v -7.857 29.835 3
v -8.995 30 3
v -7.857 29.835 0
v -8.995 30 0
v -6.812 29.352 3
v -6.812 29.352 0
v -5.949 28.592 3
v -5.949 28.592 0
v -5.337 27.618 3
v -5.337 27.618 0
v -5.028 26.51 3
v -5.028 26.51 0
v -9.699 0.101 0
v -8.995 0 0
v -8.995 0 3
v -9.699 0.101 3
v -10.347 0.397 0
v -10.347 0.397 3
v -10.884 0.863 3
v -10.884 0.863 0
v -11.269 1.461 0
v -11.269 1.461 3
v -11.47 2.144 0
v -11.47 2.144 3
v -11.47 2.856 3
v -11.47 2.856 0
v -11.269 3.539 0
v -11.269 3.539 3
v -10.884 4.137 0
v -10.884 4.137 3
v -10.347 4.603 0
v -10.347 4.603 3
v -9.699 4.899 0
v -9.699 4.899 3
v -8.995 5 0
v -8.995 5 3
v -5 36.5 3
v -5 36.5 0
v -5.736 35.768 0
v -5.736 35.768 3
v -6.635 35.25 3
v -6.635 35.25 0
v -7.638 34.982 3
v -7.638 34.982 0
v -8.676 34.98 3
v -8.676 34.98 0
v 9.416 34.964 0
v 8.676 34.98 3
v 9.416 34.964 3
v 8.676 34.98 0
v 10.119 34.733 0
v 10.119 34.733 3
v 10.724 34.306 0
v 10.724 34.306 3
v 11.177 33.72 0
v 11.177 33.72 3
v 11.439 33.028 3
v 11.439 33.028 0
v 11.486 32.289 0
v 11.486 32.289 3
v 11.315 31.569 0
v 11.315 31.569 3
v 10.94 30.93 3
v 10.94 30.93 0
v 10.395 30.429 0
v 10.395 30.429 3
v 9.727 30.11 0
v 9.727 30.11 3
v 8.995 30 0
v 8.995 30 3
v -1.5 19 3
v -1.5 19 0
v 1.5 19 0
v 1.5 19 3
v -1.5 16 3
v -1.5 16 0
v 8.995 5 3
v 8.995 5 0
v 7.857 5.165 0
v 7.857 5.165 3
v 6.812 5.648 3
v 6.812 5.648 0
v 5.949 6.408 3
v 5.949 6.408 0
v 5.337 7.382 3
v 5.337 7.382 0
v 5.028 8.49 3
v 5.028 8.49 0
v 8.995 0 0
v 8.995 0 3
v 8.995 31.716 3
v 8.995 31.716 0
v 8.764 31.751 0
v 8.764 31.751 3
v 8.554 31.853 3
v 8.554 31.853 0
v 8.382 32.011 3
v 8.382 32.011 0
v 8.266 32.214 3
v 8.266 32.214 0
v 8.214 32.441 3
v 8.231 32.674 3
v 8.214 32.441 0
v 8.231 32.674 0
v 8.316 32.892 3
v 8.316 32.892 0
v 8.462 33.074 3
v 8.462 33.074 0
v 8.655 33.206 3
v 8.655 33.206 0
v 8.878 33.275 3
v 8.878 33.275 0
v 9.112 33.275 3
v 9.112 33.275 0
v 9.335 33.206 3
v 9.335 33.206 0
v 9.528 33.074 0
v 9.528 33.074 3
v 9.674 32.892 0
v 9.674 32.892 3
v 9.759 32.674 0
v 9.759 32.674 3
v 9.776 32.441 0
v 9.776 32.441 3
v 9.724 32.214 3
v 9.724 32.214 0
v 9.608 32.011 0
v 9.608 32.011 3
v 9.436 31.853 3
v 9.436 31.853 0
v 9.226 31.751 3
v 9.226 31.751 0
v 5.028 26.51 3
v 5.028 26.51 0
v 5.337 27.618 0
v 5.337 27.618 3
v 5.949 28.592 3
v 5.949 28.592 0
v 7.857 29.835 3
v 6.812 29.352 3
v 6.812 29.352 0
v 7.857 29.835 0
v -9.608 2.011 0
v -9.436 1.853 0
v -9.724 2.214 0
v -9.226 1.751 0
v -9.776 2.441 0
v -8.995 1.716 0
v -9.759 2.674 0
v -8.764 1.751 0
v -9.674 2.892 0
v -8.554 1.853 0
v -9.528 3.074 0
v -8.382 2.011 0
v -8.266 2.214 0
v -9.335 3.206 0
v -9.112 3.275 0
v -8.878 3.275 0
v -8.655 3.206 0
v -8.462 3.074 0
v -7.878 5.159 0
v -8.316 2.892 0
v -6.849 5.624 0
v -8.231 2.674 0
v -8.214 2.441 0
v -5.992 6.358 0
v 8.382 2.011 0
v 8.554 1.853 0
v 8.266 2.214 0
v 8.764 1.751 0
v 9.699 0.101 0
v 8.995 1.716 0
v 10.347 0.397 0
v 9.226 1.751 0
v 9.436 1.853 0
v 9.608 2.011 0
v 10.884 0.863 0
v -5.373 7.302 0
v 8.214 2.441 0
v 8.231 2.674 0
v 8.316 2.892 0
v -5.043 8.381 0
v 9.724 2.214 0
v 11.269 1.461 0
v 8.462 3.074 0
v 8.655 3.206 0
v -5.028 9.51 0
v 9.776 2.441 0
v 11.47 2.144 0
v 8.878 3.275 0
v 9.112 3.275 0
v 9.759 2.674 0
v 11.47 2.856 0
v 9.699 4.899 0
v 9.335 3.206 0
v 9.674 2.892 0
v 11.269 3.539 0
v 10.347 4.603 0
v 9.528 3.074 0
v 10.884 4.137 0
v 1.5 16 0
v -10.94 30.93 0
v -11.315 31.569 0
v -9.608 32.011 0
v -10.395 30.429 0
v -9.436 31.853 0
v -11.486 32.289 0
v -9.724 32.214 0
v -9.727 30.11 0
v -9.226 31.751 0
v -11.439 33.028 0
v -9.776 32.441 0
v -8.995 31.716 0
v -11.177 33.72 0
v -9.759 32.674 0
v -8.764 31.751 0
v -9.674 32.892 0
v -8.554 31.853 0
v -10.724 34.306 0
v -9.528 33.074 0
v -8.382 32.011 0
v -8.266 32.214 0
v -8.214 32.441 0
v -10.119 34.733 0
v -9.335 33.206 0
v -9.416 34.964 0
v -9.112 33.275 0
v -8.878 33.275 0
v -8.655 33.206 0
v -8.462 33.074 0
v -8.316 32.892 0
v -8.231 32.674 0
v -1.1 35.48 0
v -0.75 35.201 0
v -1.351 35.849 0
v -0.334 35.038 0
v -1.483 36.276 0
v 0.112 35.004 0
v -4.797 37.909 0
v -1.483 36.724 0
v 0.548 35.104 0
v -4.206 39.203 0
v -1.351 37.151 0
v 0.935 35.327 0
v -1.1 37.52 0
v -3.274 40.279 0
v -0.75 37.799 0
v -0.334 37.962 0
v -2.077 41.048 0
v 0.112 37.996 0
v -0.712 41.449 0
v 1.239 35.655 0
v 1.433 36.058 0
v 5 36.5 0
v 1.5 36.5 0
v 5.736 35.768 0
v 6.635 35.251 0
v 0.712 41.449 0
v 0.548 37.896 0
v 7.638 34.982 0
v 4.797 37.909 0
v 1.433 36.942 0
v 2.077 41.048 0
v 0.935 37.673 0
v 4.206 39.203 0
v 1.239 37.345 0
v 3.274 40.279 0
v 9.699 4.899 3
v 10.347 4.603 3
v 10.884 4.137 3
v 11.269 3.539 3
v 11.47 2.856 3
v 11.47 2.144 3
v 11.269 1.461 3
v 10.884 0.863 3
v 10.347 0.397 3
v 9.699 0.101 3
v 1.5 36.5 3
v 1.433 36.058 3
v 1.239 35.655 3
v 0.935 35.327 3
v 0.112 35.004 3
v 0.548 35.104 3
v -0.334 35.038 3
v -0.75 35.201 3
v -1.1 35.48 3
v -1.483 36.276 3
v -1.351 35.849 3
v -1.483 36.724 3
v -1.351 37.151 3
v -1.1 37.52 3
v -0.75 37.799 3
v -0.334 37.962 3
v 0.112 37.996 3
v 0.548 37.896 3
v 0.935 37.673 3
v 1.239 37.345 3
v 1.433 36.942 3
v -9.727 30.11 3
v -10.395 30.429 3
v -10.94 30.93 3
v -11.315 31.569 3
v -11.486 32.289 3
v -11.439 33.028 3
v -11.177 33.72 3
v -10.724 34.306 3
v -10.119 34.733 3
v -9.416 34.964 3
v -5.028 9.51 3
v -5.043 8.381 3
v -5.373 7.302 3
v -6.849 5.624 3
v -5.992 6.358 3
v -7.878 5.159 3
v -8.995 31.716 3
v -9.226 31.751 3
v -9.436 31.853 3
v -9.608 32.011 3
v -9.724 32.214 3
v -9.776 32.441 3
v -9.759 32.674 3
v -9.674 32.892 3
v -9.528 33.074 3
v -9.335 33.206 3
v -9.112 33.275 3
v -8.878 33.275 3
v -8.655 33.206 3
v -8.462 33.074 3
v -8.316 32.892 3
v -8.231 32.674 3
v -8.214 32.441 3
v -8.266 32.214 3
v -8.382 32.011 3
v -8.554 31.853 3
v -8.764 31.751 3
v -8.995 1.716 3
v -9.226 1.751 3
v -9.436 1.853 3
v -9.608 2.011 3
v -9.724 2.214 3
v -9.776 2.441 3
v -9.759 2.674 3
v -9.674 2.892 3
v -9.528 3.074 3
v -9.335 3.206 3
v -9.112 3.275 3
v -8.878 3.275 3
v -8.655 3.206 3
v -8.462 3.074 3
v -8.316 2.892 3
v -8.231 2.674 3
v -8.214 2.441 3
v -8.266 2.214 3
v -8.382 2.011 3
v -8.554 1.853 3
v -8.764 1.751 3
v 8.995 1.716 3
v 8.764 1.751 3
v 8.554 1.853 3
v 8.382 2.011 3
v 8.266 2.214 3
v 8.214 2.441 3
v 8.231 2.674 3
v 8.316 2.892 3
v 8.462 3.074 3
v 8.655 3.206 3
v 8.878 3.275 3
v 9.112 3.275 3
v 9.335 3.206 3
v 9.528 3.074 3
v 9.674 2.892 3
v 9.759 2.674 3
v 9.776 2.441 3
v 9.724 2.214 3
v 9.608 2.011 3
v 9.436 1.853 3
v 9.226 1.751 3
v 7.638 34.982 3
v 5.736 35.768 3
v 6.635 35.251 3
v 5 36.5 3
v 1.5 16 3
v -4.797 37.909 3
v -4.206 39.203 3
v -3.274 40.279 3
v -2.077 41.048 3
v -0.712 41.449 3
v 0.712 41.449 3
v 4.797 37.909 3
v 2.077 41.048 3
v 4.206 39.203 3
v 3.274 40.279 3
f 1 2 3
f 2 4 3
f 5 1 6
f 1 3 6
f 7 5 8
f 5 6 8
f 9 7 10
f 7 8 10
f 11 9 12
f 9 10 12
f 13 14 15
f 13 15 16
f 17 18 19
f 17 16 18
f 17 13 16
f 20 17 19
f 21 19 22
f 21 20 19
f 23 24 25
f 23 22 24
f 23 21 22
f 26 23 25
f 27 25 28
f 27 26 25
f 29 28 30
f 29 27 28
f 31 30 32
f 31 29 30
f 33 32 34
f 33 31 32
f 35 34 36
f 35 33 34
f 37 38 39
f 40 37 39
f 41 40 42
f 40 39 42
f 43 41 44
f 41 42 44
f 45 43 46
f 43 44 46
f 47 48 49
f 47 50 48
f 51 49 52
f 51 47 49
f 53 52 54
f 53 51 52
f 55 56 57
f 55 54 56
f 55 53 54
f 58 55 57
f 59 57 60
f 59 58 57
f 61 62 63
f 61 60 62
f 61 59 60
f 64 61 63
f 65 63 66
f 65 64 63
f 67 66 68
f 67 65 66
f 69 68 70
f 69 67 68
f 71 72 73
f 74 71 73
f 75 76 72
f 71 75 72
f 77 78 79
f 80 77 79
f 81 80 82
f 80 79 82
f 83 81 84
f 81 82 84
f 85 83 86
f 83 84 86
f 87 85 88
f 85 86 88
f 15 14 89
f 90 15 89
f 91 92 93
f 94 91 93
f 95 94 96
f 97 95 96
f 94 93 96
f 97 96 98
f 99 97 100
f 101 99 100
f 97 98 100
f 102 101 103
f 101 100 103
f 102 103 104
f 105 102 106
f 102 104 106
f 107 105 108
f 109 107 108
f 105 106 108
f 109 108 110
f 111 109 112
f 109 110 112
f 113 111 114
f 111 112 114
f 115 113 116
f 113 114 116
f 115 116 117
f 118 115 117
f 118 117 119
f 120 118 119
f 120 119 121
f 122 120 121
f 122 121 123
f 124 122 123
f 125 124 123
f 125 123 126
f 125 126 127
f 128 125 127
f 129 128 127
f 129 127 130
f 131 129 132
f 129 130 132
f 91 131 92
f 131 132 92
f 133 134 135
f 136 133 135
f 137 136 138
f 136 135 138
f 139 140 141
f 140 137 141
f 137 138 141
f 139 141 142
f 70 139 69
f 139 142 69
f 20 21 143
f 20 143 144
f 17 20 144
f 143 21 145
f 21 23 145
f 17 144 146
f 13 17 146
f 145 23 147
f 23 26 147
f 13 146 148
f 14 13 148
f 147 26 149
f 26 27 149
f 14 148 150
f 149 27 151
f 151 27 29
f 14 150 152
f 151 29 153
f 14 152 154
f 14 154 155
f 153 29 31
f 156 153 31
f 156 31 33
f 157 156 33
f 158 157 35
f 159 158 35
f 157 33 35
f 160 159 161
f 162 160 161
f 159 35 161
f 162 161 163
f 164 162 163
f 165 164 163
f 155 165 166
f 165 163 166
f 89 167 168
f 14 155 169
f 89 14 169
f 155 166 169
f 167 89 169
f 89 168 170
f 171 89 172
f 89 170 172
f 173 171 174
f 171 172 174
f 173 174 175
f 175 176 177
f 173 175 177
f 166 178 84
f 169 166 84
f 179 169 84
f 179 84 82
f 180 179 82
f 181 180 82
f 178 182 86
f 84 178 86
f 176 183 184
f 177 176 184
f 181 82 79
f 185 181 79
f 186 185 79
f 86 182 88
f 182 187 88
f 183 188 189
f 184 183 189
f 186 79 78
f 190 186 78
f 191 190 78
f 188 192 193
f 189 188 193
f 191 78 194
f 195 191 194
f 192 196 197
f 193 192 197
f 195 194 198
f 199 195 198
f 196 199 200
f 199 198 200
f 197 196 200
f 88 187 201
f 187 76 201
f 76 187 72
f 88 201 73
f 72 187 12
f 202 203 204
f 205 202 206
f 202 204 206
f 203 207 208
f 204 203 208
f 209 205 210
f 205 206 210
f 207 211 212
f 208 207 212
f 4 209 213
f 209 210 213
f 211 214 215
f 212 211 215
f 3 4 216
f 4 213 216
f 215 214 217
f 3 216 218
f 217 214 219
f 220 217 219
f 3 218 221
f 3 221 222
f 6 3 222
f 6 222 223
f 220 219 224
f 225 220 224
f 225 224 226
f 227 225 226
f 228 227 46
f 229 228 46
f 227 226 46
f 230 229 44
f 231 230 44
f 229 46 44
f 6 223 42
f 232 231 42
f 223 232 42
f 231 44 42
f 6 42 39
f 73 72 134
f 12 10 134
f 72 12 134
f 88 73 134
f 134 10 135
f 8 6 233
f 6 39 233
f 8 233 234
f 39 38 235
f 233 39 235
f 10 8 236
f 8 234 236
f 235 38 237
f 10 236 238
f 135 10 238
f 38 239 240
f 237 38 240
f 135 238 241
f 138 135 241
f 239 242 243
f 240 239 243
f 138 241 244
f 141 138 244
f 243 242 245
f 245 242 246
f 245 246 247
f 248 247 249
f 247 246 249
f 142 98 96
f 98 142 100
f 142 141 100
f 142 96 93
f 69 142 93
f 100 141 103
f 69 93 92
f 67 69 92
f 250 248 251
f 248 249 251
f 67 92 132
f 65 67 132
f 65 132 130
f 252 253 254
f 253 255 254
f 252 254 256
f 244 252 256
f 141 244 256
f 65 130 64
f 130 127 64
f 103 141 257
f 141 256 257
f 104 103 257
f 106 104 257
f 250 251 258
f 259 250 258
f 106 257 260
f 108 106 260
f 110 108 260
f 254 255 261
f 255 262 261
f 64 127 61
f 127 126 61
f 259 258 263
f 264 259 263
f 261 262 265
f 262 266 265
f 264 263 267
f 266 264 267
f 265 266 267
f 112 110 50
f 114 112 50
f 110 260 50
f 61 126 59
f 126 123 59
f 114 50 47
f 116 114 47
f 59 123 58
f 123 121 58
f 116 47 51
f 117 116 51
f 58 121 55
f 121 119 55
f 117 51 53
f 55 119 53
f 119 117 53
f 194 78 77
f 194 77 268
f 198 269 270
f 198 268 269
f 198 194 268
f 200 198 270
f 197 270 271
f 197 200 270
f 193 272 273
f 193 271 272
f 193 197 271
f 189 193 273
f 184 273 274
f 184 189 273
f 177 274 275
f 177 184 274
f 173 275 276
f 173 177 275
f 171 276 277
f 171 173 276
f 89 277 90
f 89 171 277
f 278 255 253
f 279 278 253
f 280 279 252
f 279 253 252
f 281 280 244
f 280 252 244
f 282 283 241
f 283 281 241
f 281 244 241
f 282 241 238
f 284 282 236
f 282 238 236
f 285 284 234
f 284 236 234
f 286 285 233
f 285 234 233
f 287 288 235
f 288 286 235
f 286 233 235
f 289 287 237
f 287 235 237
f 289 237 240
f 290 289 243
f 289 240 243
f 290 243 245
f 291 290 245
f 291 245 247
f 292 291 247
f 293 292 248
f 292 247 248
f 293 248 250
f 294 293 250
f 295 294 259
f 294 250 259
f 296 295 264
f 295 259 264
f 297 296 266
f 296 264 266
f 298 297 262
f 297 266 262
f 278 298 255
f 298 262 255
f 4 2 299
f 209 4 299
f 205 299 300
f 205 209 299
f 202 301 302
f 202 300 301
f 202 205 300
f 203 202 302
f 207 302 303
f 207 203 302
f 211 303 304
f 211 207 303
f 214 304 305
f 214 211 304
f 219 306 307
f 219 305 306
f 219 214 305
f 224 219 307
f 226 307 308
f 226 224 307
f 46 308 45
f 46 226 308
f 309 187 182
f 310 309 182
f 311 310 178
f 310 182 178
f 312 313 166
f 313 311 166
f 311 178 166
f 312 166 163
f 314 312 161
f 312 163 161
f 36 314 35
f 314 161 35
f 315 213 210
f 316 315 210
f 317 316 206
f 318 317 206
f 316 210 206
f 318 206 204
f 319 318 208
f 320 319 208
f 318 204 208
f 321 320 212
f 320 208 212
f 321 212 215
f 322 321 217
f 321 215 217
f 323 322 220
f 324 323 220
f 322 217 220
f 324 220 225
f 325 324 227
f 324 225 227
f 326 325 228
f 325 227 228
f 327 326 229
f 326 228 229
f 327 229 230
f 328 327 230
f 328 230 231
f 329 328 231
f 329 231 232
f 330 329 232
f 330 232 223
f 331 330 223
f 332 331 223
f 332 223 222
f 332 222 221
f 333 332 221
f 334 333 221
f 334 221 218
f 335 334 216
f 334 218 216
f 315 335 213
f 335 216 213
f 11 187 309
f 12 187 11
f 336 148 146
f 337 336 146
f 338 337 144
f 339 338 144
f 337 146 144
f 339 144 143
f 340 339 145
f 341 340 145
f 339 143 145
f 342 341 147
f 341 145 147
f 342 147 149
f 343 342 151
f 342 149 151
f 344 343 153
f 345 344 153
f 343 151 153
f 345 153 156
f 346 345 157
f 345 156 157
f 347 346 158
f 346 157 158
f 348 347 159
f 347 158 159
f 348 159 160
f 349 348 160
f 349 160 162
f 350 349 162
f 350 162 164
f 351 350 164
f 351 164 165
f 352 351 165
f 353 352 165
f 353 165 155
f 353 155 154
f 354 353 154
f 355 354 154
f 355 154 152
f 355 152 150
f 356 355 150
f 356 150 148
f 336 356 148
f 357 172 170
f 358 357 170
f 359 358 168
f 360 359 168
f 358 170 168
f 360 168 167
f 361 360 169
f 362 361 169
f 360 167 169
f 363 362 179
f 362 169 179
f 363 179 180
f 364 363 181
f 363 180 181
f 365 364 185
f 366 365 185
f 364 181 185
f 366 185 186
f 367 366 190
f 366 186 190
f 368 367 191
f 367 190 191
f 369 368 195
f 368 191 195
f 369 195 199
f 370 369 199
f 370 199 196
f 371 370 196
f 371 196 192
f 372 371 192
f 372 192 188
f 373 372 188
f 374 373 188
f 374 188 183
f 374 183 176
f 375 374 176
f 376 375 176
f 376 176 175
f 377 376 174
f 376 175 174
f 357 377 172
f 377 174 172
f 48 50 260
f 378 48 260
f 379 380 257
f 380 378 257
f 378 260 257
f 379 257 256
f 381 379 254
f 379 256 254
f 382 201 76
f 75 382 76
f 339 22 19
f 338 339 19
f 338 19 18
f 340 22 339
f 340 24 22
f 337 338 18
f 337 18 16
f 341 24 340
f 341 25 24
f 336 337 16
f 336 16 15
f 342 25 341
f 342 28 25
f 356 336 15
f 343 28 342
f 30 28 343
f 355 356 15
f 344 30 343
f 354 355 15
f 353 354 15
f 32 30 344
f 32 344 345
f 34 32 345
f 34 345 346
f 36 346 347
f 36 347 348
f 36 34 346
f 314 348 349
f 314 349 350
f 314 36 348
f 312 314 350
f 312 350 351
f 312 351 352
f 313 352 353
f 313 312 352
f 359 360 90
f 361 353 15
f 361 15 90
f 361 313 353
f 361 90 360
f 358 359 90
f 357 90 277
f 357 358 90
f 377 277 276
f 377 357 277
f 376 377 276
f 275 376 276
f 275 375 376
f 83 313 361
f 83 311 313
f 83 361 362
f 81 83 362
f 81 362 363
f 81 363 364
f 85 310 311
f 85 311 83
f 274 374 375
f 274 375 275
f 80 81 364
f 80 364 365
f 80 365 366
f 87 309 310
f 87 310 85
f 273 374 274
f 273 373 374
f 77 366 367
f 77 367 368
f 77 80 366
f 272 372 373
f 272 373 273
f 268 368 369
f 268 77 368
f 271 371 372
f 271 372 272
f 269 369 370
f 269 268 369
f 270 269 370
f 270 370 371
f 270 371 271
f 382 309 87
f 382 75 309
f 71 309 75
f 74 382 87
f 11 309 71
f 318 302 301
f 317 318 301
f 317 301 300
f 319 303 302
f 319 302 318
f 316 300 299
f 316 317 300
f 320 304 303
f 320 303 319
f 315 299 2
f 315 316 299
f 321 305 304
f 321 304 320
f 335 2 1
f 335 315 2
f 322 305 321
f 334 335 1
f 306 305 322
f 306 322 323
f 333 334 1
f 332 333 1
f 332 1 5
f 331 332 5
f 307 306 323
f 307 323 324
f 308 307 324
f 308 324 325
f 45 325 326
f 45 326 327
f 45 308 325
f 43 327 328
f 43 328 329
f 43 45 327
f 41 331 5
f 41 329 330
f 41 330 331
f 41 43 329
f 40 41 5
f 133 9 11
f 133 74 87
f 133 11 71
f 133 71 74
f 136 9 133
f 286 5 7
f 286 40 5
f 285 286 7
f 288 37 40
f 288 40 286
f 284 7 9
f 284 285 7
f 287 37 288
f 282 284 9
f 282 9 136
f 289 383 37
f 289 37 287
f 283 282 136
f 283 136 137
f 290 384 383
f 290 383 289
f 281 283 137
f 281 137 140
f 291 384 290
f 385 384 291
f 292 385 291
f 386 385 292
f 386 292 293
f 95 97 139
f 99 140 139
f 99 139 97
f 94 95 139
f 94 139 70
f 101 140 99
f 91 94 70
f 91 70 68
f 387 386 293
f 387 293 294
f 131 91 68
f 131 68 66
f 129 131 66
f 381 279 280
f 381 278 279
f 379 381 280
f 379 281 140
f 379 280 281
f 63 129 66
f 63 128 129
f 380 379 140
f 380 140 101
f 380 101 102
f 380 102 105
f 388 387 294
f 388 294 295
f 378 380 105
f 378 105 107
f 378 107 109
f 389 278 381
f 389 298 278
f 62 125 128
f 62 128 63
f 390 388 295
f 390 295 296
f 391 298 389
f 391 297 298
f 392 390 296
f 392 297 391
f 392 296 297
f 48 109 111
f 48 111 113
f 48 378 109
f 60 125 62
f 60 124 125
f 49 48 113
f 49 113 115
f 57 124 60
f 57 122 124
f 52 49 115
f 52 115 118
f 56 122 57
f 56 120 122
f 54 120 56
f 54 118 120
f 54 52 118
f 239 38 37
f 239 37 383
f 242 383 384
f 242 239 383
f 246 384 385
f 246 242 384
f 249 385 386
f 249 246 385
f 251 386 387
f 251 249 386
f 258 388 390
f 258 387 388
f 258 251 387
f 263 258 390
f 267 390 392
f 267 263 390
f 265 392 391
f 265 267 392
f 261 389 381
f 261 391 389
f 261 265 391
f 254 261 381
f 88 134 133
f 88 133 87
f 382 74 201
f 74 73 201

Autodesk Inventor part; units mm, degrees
ref_plane "YZ Plane" through (0, 0, 0) normal (1, 0, 0) x (0, 1, 0)
ref_plane "XZ Plane" through (0, 0, 0) normal (0, 1, 0) x (-1, 0, 0)
ref_plane "XY Plane" through (0, 0, 0) normal (0, 0, 1) x (1, 0, 0)
sketch "Sketch1" plane through (0, 0, 0) normal (0, 0, 1) x (1, 0, 0)
  line L0 (-8.995, 0) -> (8.995, 0)
  arc A0 (8.995, 0) -> (8.995, 5) centre (8.995, 2.5) ccw
  arc A1 (-8.995, 5) -> (-8.995, 0) centre (-8.995, 2.5) ccw
  line L1 (-8.995, 0) -> (-8.995, 5) construction
  line L2 (8.995, 0) -> (8.995, 5) construction
  arc A2 (8.995, 30) -> (8.6755, 34.9795) centre (8.995, 32.5) ccw
  arc A3 (-8.6755, 34.9795) -> (-8.995, 30) centre (-8.995, 32.5) ccw
  line L3 (-1.5, 19) -> (1.5, 19)
  line L4 (1.5, 19) -> (1.5, 16)
  line L5 (1.5, 16) -> (-1.5, 16)
  line L6 (-1.5, 16) -> (-1.5, 19)
  line L7 (-1.5, 19) -> (1.5, 16) construction
  line L8 (1.5, 19) -> (-1.5, 16) construction
  line L9 (-8.995, 35.0339) -> (-8.995, 30) construction
  line L10 (8.995, 35.0339) -> (8.995, 30) construction
  line L11 (-5.0276, 26.51) -> (5.0276, 26.51) construction
  line L12 (5.0276, 26.51) -> (5.0276, 8.49)
  line L13 (5.0276, 8.49) -> (-5.0276, 8.49) construction
  line L14 (-5.0276, 8.49) -> (-5.0276, 26.51)
  line L15 (-5.0276, 26.51) -> (5.0276, 8.49) construction
  line L16 (5.0276, 26.51) -> (-5.0276, 8.49) construction
  arc A4 (8.995, 30) -> (5.0276, 26.51) centre (8.995, 26) ccw
  arc A5 (-5.0276, 26.51) -> (-8.995, 30) centre (-8.995, 26) ccw
  arc A6 (-8.995, 5) -> (-5.0276, 9.51) centre (-8.995, 9) ccw
  arc A7 (5.0276, 8.49) -> (8.995, 5) centre (8.995, 9) ccw
  arc A8 (5, 36.5) -> (-5, 36.5) centre (0, 36.5) ccw
  line L17 (-5, 36.5) -> (5, 36.5) construction
  arc A9 (-8.995, 35.0339) -> (-5, 36.5) centre (-8.1644, 38.9467) ccw
  arc A10 (5, 36.5) -> (8.995, 35.0339) centre (8.1644, 38.9467) ccw
  circle A11 centre (0, 36.5) radius 1.5
  point P0 (0, 0)
  point P1 (-8.995, 2.5)
  point P2 (8.995, 2.5)
  point P3 (0, 17.5)
  point P4 (-11.495, 32.5)
  point P5 (-11.495, 2.5)
  point P6 (0, 41.5)
  point P7 (11.495, 32.5)
  point P8 (11.495, 2.5)
  point P9 (-8.995, 32.5169)
  dimension "d1" = 2.5
  dimension "d2" = 2.5
  dimension "d3" = 2.5
  dimension "d4" = 32.5
  dimension "d6" = 3
  dimension "d7" = 3
  dimension "d8" = 16
  dimension "d12" = 18.02
  dimension "d13" = 4
  dimension "d14" = 4
  dimension "d16" = 5
  dimension "d17" = 4
  dimension "d22" = 41.5
  dimension "d25" = 22.99
  dimension "d29" = 3
  dimension "d30" = 36.5
  dimension "d33" = 8.995
extrude "Extrusion1" add sketch "Sketch1" along normal blind 3 contours A1 A6 L14 A5 A3 A9 A8 A10 A2 A4 L12 A7 A0 L0
sketch "Sketch2" plane through (0, 0, 3) normal (0, 0, 1) x (1, 0, 0)
  arc A0 (8.995, 30) -> (8.6755, 34.9795) centre (8.995, 32.5) ccw projected
  arc A1 (-8.6755, 34.9795) -> (-8.995, 30) centre (-8.995, 32.5) ccw projected
  arc A2 (-8.995, 5) -> (-8.995, 0) centre (-8.995, 2.5) ccw projected
  arc A3 (8.995, 0) -> (8.995, 5) centre (8.995, 2.5) ccw projected
  point P0 (0, 0)
hole "Hole1" at (-8.995, 32.5, 3) at (8.995, 32.5, 3) at (8.995, 2.5, 3) at (-8.995, 2.5, 3) direction (0, 0, -1) diameter 1.567 end through all thread size "M2x0.4" class "6H" standard "ANSI Metric M Profile"
properties part number "23 - Valve Disc" material "Steel AISI 1020 107 HR"
